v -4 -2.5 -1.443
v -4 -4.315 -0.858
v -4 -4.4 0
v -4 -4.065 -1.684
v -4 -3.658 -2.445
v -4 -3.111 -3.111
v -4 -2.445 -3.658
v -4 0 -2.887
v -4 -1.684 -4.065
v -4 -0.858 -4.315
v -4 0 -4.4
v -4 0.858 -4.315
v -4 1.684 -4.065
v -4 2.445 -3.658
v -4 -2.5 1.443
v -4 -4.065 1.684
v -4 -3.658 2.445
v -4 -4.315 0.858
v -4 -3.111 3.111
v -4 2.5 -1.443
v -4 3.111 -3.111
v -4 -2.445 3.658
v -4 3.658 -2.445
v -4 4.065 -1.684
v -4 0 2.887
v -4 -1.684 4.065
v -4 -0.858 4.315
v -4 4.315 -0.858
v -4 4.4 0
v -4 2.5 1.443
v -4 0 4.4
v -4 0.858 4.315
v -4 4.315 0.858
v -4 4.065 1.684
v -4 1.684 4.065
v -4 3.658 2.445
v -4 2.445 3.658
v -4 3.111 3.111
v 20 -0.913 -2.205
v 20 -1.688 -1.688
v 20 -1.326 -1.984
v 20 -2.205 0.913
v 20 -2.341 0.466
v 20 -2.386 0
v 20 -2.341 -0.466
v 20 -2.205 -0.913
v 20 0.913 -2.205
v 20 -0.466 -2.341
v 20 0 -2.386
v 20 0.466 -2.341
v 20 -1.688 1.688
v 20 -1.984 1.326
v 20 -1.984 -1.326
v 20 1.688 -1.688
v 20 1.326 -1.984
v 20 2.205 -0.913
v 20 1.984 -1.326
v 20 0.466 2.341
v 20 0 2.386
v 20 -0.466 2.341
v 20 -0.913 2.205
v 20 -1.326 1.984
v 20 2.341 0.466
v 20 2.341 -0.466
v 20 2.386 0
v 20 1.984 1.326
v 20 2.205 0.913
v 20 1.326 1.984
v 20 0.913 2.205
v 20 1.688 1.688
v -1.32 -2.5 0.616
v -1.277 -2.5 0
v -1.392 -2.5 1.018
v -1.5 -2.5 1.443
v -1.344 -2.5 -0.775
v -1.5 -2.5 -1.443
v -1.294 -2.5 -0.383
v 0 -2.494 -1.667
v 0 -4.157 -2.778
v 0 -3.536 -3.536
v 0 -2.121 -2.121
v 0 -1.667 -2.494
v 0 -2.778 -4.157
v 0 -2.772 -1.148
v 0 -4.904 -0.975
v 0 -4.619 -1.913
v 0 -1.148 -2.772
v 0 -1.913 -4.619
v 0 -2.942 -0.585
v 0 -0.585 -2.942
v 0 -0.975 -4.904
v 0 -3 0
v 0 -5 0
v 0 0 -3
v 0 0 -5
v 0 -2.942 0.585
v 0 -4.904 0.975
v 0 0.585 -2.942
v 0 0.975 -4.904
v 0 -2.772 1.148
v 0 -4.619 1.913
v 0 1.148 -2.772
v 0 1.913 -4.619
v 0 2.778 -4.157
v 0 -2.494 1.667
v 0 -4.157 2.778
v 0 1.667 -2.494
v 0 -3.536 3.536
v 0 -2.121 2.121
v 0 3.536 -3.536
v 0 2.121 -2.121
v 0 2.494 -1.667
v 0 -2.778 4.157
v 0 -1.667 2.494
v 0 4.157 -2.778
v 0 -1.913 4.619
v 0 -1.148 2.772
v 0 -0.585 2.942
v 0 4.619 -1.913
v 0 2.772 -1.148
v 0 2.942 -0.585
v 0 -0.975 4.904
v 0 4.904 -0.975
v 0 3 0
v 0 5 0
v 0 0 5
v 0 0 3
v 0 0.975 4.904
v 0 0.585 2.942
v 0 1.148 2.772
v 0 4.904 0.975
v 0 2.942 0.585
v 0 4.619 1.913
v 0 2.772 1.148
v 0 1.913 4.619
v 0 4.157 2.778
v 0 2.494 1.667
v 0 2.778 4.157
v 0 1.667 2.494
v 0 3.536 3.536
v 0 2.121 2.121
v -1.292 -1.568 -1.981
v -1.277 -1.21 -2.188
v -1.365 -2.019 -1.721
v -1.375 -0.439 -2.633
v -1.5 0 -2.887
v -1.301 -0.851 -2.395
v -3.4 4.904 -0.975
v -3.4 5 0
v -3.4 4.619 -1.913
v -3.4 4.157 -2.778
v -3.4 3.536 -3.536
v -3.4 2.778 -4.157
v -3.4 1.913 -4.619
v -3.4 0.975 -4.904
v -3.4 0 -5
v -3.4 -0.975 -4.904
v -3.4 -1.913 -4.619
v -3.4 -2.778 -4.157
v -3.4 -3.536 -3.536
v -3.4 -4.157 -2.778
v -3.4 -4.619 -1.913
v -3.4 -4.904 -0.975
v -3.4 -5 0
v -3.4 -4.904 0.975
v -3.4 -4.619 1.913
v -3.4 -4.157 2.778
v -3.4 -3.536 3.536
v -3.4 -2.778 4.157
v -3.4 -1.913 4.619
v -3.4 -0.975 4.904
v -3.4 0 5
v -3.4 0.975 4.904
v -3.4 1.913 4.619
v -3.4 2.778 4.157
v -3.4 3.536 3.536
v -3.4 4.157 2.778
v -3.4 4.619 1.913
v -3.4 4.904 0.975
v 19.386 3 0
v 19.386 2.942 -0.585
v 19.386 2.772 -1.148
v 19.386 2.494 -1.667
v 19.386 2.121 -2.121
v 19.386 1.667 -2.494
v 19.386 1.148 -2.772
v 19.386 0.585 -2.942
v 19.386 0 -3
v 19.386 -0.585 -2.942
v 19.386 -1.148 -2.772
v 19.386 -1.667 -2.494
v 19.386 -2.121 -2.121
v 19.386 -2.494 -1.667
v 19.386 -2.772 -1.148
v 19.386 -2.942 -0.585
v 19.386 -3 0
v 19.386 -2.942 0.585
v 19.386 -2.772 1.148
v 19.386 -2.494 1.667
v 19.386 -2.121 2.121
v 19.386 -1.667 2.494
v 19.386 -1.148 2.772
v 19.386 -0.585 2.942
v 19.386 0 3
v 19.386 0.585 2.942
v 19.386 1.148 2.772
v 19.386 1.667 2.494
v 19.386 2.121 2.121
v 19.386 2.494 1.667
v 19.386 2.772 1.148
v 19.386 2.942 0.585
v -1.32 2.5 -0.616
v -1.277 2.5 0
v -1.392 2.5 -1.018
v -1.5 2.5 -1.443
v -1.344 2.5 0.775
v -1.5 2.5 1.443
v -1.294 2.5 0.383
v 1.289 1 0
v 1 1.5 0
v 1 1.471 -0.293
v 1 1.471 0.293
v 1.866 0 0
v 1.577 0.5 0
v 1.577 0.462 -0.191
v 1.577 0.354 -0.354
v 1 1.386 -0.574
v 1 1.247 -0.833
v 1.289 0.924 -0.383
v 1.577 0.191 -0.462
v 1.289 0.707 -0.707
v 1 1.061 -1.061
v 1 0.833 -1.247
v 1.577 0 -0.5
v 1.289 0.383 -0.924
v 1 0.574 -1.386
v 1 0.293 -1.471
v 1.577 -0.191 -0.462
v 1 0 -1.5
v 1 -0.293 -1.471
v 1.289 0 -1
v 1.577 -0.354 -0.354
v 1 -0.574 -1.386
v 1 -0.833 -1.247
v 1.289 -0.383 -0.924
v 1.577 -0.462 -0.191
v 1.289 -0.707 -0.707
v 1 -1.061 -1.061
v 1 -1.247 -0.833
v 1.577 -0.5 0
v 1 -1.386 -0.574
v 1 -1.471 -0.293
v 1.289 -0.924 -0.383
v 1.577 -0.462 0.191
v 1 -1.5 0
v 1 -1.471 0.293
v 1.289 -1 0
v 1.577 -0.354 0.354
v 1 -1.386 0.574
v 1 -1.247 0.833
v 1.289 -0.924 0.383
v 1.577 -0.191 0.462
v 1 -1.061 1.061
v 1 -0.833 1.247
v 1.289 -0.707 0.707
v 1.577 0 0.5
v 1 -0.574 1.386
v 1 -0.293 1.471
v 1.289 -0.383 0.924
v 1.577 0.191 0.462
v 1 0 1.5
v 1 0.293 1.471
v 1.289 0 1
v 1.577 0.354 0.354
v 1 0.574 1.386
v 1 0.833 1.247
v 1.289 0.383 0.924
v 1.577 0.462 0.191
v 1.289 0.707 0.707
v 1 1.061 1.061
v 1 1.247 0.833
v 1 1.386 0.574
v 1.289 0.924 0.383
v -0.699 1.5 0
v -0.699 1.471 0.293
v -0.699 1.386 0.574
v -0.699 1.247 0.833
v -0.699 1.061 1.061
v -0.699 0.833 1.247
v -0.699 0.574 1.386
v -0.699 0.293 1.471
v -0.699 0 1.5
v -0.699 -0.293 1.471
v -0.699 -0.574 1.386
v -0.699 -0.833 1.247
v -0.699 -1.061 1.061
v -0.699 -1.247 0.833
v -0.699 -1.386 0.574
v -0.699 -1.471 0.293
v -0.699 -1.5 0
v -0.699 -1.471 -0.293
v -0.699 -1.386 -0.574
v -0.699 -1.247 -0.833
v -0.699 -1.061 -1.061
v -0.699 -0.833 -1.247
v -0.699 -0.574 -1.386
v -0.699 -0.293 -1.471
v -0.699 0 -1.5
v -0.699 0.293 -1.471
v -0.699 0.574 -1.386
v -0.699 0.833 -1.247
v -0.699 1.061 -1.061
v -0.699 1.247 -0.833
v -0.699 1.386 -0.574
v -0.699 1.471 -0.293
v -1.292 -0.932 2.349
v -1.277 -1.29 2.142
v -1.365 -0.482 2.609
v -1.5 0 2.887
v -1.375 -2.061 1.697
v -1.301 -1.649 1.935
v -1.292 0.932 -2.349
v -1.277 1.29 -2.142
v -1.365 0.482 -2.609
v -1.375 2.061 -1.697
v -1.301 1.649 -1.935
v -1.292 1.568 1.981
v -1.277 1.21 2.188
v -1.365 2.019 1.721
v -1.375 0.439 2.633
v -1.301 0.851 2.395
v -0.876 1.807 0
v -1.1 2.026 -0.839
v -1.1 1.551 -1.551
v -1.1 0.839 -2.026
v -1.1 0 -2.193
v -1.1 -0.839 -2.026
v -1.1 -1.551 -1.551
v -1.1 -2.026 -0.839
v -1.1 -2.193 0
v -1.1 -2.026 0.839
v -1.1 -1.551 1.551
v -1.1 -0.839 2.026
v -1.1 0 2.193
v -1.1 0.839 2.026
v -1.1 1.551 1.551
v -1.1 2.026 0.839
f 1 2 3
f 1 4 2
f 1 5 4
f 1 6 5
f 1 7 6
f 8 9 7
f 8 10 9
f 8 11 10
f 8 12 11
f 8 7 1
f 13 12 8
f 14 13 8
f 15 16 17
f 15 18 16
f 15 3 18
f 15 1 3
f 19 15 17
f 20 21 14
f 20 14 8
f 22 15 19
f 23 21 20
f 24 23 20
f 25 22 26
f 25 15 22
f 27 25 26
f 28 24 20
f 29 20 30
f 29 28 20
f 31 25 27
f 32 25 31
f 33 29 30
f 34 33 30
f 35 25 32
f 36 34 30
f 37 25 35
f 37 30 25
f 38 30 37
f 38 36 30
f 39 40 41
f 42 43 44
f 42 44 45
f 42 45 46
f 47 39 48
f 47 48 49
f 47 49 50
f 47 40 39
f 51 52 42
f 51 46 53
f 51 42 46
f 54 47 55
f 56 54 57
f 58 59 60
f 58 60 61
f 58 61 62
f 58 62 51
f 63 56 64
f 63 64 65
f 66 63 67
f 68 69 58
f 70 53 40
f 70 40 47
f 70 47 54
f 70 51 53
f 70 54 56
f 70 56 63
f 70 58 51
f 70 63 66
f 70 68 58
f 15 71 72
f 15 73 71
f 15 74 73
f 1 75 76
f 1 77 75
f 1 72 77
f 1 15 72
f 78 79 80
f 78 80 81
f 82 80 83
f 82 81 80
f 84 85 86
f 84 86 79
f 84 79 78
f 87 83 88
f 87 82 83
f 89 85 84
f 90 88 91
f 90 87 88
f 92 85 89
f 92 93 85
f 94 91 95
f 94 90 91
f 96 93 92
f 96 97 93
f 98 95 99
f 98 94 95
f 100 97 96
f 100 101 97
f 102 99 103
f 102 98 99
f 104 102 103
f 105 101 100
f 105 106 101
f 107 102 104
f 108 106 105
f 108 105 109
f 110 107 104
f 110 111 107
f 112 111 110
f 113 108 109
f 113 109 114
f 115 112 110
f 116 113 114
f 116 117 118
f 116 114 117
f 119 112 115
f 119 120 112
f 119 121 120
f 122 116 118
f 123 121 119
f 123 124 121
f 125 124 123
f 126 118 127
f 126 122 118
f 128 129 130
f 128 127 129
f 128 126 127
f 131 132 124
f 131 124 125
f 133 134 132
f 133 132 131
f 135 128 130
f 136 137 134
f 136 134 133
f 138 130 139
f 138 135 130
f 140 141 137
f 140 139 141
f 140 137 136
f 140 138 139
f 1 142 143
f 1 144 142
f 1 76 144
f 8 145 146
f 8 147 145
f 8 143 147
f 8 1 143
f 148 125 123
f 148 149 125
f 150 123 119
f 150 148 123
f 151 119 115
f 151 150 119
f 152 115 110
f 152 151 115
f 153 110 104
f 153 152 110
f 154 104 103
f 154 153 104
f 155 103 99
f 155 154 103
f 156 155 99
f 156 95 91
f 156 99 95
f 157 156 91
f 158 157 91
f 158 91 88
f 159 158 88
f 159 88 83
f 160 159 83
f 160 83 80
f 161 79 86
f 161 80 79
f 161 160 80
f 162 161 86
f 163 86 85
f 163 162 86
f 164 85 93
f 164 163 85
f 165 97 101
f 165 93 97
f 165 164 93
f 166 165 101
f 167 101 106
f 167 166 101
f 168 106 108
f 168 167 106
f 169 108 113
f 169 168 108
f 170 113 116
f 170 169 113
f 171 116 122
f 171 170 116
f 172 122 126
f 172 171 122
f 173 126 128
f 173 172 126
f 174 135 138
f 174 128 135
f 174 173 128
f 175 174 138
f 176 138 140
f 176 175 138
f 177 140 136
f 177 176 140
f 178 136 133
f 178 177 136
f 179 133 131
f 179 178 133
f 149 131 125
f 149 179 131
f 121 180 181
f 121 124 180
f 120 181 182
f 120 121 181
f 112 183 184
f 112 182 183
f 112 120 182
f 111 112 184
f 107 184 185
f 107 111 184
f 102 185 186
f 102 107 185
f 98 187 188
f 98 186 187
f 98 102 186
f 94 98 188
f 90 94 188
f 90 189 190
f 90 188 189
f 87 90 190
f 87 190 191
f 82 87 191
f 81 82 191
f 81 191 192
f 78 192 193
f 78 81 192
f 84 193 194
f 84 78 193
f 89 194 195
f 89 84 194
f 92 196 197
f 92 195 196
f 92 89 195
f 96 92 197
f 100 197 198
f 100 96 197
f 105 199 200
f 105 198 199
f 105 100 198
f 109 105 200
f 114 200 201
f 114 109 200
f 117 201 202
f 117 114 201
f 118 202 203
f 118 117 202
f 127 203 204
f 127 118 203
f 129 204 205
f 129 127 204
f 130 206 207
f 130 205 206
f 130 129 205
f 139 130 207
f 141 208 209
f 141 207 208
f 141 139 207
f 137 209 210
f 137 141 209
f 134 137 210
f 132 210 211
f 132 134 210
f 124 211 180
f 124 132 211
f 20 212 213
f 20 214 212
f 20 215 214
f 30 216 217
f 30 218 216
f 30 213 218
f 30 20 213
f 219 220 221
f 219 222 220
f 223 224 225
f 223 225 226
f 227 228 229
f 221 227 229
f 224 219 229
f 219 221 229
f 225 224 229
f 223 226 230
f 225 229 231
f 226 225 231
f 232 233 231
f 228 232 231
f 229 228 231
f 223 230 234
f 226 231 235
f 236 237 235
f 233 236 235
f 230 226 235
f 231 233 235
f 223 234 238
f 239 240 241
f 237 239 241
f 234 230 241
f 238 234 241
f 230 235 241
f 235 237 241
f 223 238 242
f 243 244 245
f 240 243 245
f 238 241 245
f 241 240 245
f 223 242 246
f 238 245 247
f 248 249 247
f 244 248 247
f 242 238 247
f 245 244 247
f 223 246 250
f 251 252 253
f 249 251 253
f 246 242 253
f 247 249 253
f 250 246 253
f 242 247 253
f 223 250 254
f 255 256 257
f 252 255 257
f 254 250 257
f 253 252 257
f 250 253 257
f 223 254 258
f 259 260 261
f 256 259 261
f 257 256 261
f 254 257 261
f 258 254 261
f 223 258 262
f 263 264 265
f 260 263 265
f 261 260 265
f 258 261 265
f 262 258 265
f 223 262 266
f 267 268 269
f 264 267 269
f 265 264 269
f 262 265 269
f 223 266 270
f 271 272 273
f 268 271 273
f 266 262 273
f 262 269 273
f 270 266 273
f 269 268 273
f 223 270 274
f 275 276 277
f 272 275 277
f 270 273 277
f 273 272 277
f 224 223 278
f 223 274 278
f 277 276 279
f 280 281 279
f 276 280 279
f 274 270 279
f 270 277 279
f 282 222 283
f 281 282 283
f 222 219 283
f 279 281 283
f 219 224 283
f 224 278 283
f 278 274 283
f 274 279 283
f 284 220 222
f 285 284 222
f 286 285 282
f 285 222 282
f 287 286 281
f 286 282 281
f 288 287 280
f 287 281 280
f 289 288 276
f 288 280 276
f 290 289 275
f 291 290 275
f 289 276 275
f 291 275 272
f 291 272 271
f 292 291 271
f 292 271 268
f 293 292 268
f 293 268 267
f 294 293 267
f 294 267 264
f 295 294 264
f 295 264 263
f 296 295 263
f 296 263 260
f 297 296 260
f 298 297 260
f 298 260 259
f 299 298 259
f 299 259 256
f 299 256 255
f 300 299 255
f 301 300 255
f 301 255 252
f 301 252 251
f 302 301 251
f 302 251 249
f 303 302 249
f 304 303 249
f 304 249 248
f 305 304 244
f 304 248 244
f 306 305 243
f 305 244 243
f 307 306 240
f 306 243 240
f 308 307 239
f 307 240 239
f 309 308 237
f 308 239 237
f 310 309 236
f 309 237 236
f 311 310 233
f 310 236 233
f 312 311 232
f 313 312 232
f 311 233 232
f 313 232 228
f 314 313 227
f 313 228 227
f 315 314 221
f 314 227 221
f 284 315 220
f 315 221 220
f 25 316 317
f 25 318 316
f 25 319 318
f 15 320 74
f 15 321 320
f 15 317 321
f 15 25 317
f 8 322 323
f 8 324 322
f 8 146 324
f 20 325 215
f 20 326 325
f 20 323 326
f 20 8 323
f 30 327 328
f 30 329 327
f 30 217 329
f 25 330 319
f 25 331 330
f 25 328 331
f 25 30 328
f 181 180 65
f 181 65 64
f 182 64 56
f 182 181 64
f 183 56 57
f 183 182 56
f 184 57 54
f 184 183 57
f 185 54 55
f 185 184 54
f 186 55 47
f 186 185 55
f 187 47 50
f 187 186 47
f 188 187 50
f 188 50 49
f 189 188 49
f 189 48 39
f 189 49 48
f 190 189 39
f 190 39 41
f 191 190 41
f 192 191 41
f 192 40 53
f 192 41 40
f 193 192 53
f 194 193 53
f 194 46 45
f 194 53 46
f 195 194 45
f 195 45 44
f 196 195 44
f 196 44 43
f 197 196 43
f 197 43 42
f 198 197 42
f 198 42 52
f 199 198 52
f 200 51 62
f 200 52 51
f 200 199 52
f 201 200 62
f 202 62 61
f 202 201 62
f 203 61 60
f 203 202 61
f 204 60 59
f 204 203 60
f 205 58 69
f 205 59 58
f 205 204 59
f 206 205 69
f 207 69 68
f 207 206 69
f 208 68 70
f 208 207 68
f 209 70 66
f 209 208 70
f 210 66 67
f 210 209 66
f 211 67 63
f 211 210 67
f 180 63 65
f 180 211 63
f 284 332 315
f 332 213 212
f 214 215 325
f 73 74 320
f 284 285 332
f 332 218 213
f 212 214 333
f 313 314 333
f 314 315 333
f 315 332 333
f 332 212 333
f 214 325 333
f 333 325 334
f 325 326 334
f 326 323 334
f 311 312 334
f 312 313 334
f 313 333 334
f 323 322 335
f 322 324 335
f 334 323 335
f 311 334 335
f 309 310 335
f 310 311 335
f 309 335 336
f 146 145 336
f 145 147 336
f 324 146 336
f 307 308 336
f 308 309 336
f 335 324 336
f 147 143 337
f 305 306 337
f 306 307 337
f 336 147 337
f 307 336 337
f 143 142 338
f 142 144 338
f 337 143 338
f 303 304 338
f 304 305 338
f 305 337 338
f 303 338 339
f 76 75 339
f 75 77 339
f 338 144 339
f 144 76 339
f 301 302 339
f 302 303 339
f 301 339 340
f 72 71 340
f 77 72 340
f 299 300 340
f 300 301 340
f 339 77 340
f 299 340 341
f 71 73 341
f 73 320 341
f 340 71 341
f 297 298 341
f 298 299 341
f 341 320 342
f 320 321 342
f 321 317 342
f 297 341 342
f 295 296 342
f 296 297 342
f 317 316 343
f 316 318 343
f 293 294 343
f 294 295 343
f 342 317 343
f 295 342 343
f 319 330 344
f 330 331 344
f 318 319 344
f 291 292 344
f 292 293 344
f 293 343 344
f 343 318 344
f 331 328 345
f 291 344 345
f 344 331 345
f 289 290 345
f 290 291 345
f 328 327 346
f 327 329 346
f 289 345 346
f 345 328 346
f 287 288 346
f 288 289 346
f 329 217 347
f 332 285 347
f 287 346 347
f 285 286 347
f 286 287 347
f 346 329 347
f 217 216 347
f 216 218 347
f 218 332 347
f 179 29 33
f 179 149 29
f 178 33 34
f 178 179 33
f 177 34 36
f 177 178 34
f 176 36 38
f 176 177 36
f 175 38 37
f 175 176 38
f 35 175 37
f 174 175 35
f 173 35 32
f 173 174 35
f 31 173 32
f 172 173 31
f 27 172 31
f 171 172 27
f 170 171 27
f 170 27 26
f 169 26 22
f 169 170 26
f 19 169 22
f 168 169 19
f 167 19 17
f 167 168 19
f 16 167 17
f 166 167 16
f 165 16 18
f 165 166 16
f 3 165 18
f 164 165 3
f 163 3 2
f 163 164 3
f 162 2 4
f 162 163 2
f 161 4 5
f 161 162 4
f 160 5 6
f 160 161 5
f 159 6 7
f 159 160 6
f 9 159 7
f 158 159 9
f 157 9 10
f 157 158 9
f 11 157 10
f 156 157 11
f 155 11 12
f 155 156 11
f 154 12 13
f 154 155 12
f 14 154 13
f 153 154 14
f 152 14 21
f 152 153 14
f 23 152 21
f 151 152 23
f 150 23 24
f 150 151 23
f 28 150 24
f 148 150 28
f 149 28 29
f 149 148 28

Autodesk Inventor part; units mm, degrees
ref_plane "YZ Plane" through (0, 0, 0) normal (1, 0, 0) x (0, 1, 0)
ref_plane "XZ Plane" through (0, 0, 0) normal (0, 1, 0) x (-1, 0, 0)
sketch "Skizze1" plane through (0, 0, 0) normal (0, 0, 1) x (1, 0, 0)
  line L0 (1.866, 0) -> (20, 0)
  line L1 (20, 0) -> (20, 3)
  line L2 (20, 3) -> (0, 3)
  line L3 (0, 3) -> (0, 5)
  line L4 (0, 5) -> (-4, 5)
  line L5 (-4, 5) -> (-4, 2.8868)
  line L6 (-4, 2.8868) -> (-1.5, 2.8868)
  line L7 (-1.5, 2.8868) -> (-0.6994, 1.5)
  line L8 (-8.8, 0) -> (24.8, 0) projected
  line L9 (0, -1) -> (0, 6) projected
  line L10 (-0.6994, 1.5) -> (1, 1.5)
  line L11 (1, 1.5) -> (1.866, 0)
  line L12 (-4, 2.8868) -> (-4, 0) construction
  line L13 (-4, 4.4) -> (-3.4, 5)
  dimension "d0" = 4
  dimension "d1" = 2.5
  dimension "d2" = 60
  dimension "d3" = 6
  dimension "d4" = 5.7735
  dimension "d5" = 10
  dimension "d15" = 5
  dimension "d16" = 3
  dimension "d17" = 20
  dimension "d32" = 45
  dimension "d33" = 0.6
revolve "Körper" add sketch "Skizze1" angle 360 about axis through (1.866, 0, 0) along (1, 0, 0) contours L11 L10 L9 L2 L1 L0 | L10 L7 L6 L5 L13 L4 L3 L9 | L13 L5 L4
revolve "Fase2" cut sketch "Skizze1" angle 360 about axis through (-10, 0, 0) along (1, 0, 0) contours L13 L5 L4
sketch "Skizze2" plane through (-4, 0, 0) normal (-1, 0, 0) x (0, 0, 1)
  circle A0 centre (0, 0) radius 2.8868 projected
  line L0 (0, -7) -> (0, 7) projected
  line L1 (-7, 0) -> (7, 0) projected
  line L2 (2.8868, 0) -> (1.4434, -2.5)
  line L3 (1.4434, -2.5) -> (-1.4434, -2.5)
  line L4 (-1.4434, -2.5) -> (-2.8868, 0)
  line L5 (-2.8868, 0) -> (-1.4434, 2.5)
  line L6 (-1.4434, 2.5) -> (1.4434, 2.5)
  line L7 (1.4434, 2.5) -> (2.8868, 0)
extrude "Loch" add sketch "Skizze2" against normal up to next contours L7 A0 | A0 L2 | L6 L0 A0 | A0 L0 L3 | L0 L6 A0 | A0 L3 L0 | L4 A0 | A0 L5
thread "Gewinde" size "M6x1" class "6g" standard "ISO Metric profile" length 14.5
chamfer "Fase1" distance 0.6135 distance2 0.6135 1 edges at (20, -3, 0) measured on face at (20, 1.0659, 1.0214)
ref_plane "Work Plane1" through (10, 0, 0) normal (0, 0.5, 0.866) x (1, 0, 0)
equation "\"d0\" = KOH"
equation "\"d1\" = INTI"
equation "\"d3\" = GD"
equation "\"d4\" = 1.1547 * SW"
equation "\"d5\" = KOD"
equation "\"d15\" = INFT"
equation "\"d16\" = SDT"
equation "\"d17\" = NLG"
equation "\"d33\" = Cham"
equation "\"d7\" = GEL"
equation "\"d9\" = -0.5 * SPD + 0.5 * GD"
equation "\"d12\" = GUL"
equation "\"GD\" = NND"
equation "\"NLG\" = 20"
equation "\"GEL\" = 14.5"
equation "\"KOD\" = 10"
equation "\"KOH\" = 4"
equation "\"GUL\" = 0.61345 * PTC"
equation "\"SW\" = 5"
equation "\"INTI\" = 2.5"
equation "\"SPD\" = NND - 1.2269 * PTC"
equation "\"SDT\" = 3"
equation "\"INFT\" = 5"
equation "\"Cham\" = 0.6"
equation "\"TOA\" = 30deg"
equation "\"GD1\" = THREADDIA - 1.2269 * PTC"
equation "\"THREADDIA\" = 6"
equation "\"BDM\" = NND"
equation "\"FAWI\" = 45deg"
equation "\"RR\" = 0.1 * NND"
equation "\"PTC\" = 1"
equation "\"NND\" = 6"
equation "\"FAWI1\" = 45deg"
equation "\"GAL\" = 0.61345 * PTC"
equation "\"E0\" = 1.155 * SW"
properties part number "DIN 6912 - M6 x 20" material "Stahl, weich"
